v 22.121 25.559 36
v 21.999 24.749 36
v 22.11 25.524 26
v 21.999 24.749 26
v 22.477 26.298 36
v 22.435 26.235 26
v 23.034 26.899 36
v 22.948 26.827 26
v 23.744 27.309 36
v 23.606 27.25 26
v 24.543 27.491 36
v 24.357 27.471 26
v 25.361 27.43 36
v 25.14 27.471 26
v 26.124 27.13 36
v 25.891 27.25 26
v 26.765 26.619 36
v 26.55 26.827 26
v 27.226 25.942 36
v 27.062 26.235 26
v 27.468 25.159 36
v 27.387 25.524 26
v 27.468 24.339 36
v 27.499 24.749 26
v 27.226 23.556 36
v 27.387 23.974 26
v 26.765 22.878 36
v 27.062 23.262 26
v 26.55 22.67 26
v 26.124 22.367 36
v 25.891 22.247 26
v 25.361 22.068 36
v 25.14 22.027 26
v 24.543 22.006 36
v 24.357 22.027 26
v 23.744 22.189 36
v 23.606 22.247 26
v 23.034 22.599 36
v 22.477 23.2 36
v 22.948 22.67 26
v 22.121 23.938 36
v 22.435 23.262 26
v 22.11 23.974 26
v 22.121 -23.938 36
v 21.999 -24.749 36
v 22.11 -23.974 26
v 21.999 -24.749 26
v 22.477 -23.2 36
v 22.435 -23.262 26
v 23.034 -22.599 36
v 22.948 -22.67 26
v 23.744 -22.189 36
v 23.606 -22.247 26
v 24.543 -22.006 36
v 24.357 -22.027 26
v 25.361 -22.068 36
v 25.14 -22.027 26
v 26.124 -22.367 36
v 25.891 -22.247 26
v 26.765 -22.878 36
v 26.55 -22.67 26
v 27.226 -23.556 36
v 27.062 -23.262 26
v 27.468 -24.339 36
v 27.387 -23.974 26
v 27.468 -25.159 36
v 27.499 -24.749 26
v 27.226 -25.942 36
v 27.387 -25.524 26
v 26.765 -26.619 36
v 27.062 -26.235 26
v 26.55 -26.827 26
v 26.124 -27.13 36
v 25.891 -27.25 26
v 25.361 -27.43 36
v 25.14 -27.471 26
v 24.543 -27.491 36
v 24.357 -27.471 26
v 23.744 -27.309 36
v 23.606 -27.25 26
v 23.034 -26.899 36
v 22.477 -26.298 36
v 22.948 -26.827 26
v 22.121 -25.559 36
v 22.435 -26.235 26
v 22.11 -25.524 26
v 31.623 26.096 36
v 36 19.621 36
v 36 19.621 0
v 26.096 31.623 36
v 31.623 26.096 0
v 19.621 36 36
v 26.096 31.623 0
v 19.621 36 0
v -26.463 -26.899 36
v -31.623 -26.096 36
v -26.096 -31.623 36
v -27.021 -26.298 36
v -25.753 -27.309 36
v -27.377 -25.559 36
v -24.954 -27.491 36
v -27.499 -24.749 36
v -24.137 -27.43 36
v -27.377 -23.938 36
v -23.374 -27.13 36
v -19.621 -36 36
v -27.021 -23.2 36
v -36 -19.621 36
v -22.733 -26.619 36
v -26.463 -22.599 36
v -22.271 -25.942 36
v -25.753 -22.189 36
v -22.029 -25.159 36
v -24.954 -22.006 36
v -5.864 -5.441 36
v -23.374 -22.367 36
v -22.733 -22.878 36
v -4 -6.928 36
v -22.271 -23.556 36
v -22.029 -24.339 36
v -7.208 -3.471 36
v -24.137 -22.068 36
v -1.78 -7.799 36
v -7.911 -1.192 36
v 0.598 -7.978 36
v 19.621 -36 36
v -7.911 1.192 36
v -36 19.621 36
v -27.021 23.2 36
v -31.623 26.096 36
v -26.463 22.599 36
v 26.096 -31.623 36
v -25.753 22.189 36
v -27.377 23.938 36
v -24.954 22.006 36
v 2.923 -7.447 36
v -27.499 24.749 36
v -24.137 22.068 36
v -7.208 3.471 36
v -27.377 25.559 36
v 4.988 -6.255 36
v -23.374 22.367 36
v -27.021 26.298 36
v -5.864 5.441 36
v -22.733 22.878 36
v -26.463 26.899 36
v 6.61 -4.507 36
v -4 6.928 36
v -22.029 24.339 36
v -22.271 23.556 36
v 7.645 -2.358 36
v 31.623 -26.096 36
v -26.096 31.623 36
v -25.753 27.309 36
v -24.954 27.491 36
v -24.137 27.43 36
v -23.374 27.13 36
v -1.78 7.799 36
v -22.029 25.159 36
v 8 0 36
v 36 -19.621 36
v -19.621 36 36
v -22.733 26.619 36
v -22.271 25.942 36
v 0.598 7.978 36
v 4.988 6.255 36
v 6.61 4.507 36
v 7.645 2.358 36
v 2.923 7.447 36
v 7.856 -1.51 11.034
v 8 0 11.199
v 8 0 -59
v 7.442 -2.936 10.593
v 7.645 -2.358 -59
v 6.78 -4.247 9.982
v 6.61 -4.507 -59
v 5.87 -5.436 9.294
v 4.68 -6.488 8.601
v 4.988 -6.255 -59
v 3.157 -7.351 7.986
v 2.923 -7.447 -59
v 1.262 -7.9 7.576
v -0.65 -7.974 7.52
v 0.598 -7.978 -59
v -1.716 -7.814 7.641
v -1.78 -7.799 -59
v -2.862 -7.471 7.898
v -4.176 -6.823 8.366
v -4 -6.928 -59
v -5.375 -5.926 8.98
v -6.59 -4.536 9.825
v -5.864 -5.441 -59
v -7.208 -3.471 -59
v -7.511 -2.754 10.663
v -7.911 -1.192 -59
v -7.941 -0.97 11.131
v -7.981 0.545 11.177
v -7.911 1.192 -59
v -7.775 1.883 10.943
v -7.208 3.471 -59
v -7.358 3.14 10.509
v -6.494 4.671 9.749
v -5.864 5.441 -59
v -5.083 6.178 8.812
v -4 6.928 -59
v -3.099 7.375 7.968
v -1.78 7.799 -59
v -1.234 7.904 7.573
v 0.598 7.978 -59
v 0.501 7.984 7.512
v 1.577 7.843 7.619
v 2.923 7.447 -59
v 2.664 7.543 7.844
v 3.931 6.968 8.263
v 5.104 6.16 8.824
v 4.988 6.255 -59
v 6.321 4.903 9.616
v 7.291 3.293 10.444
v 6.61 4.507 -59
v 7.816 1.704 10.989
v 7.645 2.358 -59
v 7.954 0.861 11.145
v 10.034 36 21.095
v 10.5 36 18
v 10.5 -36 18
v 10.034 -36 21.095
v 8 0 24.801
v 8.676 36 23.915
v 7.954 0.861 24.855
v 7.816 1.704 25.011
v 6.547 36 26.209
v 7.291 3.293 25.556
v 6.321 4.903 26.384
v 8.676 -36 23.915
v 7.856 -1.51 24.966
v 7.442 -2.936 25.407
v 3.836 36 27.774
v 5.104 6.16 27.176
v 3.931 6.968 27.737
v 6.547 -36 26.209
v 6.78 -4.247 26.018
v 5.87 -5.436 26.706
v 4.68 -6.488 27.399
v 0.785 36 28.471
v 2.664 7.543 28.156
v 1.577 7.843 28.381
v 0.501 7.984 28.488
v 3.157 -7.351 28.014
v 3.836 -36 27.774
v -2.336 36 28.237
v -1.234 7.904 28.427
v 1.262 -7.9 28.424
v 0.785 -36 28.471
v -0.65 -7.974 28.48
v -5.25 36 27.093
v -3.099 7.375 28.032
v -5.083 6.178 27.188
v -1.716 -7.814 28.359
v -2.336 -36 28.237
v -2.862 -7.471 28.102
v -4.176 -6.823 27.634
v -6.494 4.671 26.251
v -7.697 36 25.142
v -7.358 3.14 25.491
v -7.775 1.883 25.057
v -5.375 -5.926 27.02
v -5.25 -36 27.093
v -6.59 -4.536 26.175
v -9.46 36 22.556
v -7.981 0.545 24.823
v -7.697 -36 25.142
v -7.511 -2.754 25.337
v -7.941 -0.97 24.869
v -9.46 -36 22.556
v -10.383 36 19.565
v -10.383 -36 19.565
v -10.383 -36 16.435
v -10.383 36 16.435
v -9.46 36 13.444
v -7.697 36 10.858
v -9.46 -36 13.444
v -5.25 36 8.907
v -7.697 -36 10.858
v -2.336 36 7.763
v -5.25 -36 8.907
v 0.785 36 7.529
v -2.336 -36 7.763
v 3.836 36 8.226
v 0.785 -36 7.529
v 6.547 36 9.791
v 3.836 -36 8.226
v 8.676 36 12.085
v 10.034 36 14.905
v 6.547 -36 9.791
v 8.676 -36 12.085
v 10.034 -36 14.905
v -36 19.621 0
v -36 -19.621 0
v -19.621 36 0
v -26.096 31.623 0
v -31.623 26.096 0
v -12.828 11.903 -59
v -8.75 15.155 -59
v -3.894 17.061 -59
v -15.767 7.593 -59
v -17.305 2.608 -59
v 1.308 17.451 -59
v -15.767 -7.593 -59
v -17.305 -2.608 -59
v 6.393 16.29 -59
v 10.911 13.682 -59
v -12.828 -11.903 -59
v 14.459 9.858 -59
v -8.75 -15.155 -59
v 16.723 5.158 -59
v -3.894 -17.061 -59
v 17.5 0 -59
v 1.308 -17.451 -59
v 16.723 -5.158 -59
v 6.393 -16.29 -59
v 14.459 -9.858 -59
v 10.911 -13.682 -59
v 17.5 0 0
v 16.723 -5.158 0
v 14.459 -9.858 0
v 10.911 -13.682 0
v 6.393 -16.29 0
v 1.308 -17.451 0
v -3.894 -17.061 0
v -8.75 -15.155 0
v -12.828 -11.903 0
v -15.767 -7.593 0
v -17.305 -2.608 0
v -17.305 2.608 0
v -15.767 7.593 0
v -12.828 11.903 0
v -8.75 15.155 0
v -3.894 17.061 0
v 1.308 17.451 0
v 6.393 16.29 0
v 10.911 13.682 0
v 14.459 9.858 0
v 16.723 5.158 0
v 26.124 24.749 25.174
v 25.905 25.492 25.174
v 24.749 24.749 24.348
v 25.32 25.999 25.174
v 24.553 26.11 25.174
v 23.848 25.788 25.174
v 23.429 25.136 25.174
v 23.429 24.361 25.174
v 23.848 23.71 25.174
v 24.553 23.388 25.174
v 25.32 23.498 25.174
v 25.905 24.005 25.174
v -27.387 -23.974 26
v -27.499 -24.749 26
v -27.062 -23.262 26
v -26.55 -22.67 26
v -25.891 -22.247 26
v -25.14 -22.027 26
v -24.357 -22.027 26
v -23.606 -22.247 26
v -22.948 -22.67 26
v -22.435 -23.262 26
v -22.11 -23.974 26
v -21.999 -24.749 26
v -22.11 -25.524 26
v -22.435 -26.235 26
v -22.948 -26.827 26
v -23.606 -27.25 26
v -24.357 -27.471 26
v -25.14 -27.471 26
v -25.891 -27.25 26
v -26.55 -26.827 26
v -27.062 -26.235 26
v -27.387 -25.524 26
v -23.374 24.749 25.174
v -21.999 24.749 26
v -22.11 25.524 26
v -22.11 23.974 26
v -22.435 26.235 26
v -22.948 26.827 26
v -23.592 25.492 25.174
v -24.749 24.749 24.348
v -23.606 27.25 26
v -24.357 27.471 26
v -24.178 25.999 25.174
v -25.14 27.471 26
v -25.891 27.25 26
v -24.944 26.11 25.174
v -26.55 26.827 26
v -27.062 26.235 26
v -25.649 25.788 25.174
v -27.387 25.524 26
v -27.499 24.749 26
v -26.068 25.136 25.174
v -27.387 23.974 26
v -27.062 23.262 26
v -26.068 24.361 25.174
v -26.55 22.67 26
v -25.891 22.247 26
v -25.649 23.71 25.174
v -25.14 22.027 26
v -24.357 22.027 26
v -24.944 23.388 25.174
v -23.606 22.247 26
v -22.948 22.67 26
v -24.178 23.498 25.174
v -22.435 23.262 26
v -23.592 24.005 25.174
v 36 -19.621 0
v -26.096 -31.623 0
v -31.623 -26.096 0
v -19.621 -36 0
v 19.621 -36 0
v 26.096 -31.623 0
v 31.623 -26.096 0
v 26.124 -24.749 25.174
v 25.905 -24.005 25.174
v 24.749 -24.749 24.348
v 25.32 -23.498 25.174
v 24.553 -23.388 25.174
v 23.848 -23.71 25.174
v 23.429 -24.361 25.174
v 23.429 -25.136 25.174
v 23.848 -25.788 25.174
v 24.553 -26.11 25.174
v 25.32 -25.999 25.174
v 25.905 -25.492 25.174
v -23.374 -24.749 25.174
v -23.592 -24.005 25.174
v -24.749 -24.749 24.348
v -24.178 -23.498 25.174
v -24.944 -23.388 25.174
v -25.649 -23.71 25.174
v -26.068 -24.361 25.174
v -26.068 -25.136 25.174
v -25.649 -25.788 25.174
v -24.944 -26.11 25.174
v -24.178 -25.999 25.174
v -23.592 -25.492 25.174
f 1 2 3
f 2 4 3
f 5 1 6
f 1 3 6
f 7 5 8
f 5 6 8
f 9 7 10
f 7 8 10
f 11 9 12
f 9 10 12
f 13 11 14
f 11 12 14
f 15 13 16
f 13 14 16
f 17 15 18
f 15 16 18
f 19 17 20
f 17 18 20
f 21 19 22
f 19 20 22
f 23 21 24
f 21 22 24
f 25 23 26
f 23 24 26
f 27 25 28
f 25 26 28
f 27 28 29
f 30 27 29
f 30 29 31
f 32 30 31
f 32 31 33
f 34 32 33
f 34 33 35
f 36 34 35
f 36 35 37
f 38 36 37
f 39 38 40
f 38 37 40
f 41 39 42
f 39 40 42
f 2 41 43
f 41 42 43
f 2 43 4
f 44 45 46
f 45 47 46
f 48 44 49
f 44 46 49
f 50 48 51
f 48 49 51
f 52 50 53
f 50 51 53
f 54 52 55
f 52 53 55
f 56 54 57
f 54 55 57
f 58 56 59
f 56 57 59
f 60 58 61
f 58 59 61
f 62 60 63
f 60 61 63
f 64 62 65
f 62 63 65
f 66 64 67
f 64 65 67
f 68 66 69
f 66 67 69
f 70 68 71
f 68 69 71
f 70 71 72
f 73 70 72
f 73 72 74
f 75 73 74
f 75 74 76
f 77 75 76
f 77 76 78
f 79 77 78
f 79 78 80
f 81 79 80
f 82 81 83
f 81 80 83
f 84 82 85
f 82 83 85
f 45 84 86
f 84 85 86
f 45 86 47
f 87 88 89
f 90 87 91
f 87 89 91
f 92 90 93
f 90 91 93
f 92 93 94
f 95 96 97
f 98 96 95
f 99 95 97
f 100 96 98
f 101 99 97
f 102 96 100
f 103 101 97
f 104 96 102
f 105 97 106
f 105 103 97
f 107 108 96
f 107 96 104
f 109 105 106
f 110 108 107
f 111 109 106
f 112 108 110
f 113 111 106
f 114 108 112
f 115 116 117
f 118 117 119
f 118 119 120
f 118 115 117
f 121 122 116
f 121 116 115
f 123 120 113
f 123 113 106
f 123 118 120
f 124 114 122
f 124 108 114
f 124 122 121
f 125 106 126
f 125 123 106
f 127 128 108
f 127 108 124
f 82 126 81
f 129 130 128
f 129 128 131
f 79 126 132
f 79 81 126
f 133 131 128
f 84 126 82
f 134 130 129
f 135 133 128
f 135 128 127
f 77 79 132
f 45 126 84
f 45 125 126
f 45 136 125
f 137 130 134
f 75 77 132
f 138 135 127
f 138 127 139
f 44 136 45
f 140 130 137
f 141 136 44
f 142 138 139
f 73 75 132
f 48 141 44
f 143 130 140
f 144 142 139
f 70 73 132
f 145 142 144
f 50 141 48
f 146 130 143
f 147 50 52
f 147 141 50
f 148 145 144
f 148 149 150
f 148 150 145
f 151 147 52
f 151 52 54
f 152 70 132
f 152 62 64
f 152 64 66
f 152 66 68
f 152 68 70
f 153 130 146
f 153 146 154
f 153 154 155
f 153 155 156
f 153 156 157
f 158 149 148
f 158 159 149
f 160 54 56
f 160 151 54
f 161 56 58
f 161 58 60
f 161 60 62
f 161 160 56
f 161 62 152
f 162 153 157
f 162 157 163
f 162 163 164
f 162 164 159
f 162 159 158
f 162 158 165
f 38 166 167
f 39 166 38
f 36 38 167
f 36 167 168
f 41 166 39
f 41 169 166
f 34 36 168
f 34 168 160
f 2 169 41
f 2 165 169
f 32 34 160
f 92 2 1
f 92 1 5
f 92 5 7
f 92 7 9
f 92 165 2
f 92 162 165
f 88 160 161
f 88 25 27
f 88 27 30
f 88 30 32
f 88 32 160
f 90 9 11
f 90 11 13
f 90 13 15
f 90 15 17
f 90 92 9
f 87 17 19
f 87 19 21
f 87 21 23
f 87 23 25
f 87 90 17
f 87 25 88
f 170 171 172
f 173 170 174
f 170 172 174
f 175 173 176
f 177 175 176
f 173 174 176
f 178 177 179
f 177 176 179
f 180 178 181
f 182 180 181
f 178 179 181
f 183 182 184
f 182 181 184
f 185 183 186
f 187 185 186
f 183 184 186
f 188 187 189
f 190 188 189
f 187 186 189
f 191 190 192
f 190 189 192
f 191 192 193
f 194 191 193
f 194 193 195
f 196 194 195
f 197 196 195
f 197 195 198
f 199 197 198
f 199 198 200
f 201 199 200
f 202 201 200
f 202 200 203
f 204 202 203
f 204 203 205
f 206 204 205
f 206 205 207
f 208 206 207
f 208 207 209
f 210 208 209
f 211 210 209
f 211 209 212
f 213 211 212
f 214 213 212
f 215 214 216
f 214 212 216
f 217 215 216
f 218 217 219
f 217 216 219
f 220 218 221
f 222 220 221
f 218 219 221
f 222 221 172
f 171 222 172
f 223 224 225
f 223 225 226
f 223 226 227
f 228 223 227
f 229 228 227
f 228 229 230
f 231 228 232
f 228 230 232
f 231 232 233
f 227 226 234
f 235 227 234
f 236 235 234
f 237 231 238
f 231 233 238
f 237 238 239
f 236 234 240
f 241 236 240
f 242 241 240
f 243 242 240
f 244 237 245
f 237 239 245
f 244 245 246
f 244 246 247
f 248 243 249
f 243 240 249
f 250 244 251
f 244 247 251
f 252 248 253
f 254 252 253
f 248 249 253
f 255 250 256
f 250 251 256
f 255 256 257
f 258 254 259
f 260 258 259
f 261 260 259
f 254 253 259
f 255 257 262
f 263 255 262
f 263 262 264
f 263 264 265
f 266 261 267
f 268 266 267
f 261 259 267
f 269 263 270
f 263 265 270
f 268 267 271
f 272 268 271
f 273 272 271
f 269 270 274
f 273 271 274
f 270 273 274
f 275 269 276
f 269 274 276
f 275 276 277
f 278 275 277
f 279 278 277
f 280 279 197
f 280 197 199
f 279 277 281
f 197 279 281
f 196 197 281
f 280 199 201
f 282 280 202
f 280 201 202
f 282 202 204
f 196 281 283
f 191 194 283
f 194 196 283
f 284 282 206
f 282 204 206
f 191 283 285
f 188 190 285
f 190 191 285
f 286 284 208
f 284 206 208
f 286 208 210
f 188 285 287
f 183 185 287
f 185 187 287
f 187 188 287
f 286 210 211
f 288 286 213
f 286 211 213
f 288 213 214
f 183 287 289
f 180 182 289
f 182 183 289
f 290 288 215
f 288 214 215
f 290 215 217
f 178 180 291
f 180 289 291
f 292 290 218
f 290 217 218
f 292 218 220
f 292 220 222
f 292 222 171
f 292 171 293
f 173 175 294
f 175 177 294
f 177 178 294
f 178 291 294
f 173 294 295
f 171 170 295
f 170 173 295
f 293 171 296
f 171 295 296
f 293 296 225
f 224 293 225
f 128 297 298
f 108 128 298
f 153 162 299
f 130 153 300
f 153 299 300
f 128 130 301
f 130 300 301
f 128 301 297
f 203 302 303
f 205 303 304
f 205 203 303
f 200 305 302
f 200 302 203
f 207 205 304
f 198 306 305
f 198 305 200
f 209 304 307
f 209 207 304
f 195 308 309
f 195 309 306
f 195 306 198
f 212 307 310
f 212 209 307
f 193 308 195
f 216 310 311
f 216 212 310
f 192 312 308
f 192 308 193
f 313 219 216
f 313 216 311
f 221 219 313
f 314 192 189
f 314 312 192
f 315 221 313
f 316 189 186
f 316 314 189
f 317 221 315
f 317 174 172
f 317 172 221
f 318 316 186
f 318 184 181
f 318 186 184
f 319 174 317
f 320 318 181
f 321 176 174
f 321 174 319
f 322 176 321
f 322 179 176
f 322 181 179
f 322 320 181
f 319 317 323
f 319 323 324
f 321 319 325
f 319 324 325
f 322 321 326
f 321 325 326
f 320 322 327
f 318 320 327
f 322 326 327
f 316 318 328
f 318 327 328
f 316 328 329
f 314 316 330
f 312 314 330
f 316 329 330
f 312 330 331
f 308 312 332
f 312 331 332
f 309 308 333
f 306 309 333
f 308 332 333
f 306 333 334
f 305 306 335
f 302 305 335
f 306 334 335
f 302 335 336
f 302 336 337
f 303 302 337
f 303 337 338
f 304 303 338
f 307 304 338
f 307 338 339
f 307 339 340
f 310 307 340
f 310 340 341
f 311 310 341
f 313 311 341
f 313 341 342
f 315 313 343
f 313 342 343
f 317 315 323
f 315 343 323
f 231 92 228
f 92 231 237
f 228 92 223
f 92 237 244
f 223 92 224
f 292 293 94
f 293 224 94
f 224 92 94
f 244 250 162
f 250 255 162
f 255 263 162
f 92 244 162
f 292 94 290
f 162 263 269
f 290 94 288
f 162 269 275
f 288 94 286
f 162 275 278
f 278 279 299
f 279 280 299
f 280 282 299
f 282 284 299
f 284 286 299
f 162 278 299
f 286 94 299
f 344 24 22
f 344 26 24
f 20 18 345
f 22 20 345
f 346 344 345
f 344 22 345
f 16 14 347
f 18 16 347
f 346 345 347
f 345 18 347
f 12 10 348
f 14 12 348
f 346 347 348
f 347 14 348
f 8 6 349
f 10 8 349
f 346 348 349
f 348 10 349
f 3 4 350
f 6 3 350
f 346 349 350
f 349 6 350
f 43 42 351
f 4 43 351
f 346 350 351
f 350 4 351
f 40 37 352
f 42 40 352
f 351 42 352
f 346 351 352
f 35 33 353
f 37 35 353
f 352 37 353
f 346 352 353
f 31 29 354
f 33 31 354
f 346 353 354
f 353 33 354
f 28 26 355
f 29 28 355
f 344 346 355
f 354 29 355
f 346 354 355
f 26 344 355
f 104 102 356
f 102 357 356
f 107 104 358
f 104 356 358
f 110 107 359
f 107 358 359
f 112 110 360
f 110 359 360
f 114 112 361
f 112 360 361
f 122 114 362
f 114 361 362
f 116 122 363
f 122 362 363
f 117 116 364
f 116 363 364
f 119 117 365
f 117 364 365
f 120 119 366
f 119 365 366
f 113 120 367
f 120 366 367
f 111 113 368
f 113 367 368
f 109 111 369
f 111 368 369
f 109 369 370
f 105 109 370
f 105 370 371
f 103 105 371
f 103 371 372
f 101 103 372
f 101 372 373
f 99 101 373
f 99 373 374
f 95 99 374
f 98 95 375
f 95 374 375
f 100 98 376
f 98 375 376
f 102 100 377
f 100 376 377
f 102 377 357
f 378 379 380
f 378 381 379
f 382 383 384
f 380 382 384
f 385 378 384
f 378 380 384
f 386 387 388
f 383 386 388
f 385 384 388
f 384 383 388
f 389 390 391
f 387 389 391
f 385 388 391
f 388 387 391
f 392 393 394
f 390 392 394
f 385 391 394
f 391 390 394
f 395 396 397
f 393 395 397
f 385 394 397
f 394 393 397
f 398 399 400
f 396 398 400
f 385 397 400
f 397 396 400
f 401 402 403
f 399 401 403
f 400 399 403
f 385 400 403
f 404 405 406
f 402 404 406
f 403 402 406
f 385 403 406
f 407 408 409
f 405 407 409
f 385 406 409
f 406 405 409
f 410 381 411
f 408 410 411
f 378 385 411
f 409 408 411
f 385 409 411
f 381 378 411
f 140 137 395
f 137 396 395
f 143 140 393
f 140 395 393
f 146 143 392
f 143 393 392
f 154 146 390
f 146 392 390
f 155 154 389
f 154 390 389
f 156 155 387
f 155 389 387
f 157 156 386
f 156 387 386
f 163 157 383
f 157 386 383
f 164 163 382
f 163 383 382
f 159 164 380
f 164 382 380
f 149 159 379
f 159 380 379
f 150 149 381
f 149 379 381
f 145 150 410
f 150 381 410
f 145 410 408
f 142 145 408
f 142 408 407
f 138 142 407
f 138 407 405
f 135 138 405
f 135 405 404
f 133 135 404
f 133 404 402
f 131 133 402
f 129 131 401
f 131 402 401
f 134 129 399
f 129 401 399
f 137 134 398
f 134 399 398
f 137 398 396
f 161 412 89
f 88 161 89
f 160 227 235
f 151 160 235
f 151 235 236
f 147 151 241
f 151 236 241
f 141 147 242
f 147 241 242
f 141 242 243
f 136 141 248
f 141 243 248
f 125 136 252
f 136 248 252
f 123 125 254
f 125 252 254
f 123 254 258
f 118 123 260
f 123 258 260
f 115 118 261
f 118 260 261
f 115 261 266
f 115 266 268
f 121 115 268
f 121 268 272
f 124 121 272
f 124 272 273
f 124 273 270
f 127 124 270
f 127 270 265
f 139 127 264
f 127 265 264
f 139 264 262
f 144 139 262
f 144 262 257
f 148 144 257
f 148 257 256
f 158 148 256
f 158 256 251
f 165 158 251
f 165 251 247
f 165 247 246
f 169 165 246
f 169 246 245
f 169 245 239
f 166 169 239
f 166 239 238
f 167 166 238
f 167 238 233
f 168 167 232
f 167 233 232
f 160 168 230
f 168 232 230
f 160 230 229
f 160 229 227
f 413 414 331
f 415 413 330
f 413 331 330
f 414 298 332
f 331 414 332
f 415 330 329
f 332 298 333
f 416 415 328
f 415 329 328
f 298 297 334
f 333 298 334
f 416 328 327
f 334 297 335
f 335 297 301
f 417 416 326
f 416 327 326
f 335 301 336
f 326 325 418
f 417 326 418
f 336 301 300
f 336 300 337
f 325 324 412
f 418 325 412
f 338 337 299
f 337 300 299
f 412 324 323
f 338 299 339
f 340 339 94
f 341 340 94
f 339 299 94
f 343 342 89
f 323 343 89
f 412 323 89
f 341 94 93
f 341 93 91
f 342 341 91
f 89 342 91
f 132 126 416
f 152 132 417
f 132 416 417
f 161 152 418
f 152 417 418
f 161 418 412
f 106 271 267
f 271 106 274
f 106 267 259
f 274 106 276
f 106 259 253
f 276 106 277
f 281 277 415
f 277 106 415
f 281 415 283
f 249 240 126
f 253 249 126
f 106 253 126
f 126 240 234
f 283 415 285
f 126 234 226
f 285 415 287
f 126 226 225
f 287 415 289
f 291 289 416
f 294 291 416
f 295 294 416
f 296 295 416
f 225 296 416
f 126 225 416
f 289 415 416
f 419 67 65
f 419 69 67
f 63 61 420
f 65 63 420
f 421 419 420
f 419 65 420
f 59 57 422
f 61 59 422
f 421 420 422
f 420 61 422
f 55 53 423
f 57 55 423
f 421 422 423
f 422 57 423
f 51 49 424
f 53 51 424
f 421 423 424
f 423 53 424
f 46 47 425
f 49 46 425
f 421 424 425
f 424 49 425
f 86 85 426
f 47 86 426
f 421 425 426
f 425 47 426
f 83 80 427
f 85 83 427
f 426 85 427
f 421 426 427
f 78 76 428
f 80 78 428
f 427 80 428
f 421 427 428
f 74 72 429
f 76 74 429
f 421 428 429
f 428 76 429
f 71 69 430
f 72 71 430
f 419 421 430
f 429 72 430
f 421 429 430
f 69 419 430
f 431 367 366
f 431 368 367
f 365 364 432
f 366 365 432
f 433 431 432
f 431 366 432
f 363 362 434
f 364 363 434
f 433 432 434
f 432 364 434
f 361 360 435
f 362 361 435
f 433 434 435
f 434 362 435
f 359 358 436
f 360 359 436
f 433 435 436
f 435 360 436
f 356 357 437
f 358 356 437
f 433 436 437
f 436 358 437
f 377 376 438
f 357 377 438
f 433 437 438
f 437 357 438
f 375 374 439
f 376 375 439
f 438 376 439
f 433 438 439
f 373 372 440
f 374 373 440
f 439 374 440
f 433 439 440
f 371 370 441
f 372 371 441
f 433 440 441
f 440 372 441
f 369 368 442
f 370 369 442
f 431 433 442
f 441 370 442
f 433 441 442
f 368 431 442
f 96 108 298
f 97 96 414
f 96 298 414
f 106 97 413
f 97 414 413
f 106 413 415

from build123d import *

# Parameters (mm, degrees)
F1_DEPTH = 36
F3_D     = 5.5
F3_DEPTH = 10
F3_TIP   = 1.6523667023
F5_R     = 17.5
F6_DEPTH = 59
F7_R     = 8
F8_DEPTH = 95.001
F10_D    = 21


with BuildPart() as f1:
    # F0 (on Top) → F1 (new body)
    with BuildSketch(Plane.XY):
        with BuildLine():
            Line((19.6214168703, 36), (-19.6214168703, 36))
            ThreePointArc((-19.6214168703, 36), (-28.9913780286, 28.9913780286), (-36, 19.6214168703))
            Line((-36, 19.6214168703), (-36, -19.6214168703))
            ThreePointArc((-36, -19.6214168703), (-28.9913780286, -28.9913780286), (-19.6214168703, -36))
            Line((-19.6214168703, -36), (19.6214168703, -36))
            ThreePointArc((19.6214168703, -36), (28.9913780286, -28.9913780286), (36, -19.6214168703))
            Line((36, -19.6214168703), (36, 19.6214168703))
            ThreePointArc((36, 19.6214168703), (28.9913780286, 28.9913780286), (19.6214168703, 36))
        make_face()
    extrude(amount=F1_DEPTH)

    # F3
    with Locations(Plane.XY.offset(36)):
        with Locations((-24.7487373415, 24.7487373415), (24.7487373415, 24.7487373415), (24.7487373415, -24.7487373415), (-24.7487373415, -24.7487373415)):
            Hole(F3_D / 2, depth=F3_DEPTH)
            with Locations((0, 0, -(F3_DEPTH + F3_TIP / 2))):  # 118° drill point
                Cone(0, F3_D / 2, F3_TIP, mode=Mode.SUBTRACT)

    # F5 (on face) → F6 (join)
    with BuildSketch(Plane(origin=(0, 0, 0), x_dir=(1, 0, 0), z_dir=(0, 0, -1))):
        Circle(F5_R)
    extrude(amount=F6_DEPTH)

    # F7 (on face) → F8 (cut, through all)
    with BuildSketch(Plane(origin=(0, 0, -59), x_dir=(1, 0, 0), z_dir=(0, 0, -1))):
        Circle(F7_R)
    extrude(amount=-F8_DEPTH, mode=Mode.SUBTRACT)

    # F10 (through all)
    with Locations(Plane(origin=(0, 36, 0), x_dir=(-1, 0, 0), z_dir=(0, 1, 0))):
        with Locations((0, 18)):
            Hole(F10_D / 2)


solid = f1.part
